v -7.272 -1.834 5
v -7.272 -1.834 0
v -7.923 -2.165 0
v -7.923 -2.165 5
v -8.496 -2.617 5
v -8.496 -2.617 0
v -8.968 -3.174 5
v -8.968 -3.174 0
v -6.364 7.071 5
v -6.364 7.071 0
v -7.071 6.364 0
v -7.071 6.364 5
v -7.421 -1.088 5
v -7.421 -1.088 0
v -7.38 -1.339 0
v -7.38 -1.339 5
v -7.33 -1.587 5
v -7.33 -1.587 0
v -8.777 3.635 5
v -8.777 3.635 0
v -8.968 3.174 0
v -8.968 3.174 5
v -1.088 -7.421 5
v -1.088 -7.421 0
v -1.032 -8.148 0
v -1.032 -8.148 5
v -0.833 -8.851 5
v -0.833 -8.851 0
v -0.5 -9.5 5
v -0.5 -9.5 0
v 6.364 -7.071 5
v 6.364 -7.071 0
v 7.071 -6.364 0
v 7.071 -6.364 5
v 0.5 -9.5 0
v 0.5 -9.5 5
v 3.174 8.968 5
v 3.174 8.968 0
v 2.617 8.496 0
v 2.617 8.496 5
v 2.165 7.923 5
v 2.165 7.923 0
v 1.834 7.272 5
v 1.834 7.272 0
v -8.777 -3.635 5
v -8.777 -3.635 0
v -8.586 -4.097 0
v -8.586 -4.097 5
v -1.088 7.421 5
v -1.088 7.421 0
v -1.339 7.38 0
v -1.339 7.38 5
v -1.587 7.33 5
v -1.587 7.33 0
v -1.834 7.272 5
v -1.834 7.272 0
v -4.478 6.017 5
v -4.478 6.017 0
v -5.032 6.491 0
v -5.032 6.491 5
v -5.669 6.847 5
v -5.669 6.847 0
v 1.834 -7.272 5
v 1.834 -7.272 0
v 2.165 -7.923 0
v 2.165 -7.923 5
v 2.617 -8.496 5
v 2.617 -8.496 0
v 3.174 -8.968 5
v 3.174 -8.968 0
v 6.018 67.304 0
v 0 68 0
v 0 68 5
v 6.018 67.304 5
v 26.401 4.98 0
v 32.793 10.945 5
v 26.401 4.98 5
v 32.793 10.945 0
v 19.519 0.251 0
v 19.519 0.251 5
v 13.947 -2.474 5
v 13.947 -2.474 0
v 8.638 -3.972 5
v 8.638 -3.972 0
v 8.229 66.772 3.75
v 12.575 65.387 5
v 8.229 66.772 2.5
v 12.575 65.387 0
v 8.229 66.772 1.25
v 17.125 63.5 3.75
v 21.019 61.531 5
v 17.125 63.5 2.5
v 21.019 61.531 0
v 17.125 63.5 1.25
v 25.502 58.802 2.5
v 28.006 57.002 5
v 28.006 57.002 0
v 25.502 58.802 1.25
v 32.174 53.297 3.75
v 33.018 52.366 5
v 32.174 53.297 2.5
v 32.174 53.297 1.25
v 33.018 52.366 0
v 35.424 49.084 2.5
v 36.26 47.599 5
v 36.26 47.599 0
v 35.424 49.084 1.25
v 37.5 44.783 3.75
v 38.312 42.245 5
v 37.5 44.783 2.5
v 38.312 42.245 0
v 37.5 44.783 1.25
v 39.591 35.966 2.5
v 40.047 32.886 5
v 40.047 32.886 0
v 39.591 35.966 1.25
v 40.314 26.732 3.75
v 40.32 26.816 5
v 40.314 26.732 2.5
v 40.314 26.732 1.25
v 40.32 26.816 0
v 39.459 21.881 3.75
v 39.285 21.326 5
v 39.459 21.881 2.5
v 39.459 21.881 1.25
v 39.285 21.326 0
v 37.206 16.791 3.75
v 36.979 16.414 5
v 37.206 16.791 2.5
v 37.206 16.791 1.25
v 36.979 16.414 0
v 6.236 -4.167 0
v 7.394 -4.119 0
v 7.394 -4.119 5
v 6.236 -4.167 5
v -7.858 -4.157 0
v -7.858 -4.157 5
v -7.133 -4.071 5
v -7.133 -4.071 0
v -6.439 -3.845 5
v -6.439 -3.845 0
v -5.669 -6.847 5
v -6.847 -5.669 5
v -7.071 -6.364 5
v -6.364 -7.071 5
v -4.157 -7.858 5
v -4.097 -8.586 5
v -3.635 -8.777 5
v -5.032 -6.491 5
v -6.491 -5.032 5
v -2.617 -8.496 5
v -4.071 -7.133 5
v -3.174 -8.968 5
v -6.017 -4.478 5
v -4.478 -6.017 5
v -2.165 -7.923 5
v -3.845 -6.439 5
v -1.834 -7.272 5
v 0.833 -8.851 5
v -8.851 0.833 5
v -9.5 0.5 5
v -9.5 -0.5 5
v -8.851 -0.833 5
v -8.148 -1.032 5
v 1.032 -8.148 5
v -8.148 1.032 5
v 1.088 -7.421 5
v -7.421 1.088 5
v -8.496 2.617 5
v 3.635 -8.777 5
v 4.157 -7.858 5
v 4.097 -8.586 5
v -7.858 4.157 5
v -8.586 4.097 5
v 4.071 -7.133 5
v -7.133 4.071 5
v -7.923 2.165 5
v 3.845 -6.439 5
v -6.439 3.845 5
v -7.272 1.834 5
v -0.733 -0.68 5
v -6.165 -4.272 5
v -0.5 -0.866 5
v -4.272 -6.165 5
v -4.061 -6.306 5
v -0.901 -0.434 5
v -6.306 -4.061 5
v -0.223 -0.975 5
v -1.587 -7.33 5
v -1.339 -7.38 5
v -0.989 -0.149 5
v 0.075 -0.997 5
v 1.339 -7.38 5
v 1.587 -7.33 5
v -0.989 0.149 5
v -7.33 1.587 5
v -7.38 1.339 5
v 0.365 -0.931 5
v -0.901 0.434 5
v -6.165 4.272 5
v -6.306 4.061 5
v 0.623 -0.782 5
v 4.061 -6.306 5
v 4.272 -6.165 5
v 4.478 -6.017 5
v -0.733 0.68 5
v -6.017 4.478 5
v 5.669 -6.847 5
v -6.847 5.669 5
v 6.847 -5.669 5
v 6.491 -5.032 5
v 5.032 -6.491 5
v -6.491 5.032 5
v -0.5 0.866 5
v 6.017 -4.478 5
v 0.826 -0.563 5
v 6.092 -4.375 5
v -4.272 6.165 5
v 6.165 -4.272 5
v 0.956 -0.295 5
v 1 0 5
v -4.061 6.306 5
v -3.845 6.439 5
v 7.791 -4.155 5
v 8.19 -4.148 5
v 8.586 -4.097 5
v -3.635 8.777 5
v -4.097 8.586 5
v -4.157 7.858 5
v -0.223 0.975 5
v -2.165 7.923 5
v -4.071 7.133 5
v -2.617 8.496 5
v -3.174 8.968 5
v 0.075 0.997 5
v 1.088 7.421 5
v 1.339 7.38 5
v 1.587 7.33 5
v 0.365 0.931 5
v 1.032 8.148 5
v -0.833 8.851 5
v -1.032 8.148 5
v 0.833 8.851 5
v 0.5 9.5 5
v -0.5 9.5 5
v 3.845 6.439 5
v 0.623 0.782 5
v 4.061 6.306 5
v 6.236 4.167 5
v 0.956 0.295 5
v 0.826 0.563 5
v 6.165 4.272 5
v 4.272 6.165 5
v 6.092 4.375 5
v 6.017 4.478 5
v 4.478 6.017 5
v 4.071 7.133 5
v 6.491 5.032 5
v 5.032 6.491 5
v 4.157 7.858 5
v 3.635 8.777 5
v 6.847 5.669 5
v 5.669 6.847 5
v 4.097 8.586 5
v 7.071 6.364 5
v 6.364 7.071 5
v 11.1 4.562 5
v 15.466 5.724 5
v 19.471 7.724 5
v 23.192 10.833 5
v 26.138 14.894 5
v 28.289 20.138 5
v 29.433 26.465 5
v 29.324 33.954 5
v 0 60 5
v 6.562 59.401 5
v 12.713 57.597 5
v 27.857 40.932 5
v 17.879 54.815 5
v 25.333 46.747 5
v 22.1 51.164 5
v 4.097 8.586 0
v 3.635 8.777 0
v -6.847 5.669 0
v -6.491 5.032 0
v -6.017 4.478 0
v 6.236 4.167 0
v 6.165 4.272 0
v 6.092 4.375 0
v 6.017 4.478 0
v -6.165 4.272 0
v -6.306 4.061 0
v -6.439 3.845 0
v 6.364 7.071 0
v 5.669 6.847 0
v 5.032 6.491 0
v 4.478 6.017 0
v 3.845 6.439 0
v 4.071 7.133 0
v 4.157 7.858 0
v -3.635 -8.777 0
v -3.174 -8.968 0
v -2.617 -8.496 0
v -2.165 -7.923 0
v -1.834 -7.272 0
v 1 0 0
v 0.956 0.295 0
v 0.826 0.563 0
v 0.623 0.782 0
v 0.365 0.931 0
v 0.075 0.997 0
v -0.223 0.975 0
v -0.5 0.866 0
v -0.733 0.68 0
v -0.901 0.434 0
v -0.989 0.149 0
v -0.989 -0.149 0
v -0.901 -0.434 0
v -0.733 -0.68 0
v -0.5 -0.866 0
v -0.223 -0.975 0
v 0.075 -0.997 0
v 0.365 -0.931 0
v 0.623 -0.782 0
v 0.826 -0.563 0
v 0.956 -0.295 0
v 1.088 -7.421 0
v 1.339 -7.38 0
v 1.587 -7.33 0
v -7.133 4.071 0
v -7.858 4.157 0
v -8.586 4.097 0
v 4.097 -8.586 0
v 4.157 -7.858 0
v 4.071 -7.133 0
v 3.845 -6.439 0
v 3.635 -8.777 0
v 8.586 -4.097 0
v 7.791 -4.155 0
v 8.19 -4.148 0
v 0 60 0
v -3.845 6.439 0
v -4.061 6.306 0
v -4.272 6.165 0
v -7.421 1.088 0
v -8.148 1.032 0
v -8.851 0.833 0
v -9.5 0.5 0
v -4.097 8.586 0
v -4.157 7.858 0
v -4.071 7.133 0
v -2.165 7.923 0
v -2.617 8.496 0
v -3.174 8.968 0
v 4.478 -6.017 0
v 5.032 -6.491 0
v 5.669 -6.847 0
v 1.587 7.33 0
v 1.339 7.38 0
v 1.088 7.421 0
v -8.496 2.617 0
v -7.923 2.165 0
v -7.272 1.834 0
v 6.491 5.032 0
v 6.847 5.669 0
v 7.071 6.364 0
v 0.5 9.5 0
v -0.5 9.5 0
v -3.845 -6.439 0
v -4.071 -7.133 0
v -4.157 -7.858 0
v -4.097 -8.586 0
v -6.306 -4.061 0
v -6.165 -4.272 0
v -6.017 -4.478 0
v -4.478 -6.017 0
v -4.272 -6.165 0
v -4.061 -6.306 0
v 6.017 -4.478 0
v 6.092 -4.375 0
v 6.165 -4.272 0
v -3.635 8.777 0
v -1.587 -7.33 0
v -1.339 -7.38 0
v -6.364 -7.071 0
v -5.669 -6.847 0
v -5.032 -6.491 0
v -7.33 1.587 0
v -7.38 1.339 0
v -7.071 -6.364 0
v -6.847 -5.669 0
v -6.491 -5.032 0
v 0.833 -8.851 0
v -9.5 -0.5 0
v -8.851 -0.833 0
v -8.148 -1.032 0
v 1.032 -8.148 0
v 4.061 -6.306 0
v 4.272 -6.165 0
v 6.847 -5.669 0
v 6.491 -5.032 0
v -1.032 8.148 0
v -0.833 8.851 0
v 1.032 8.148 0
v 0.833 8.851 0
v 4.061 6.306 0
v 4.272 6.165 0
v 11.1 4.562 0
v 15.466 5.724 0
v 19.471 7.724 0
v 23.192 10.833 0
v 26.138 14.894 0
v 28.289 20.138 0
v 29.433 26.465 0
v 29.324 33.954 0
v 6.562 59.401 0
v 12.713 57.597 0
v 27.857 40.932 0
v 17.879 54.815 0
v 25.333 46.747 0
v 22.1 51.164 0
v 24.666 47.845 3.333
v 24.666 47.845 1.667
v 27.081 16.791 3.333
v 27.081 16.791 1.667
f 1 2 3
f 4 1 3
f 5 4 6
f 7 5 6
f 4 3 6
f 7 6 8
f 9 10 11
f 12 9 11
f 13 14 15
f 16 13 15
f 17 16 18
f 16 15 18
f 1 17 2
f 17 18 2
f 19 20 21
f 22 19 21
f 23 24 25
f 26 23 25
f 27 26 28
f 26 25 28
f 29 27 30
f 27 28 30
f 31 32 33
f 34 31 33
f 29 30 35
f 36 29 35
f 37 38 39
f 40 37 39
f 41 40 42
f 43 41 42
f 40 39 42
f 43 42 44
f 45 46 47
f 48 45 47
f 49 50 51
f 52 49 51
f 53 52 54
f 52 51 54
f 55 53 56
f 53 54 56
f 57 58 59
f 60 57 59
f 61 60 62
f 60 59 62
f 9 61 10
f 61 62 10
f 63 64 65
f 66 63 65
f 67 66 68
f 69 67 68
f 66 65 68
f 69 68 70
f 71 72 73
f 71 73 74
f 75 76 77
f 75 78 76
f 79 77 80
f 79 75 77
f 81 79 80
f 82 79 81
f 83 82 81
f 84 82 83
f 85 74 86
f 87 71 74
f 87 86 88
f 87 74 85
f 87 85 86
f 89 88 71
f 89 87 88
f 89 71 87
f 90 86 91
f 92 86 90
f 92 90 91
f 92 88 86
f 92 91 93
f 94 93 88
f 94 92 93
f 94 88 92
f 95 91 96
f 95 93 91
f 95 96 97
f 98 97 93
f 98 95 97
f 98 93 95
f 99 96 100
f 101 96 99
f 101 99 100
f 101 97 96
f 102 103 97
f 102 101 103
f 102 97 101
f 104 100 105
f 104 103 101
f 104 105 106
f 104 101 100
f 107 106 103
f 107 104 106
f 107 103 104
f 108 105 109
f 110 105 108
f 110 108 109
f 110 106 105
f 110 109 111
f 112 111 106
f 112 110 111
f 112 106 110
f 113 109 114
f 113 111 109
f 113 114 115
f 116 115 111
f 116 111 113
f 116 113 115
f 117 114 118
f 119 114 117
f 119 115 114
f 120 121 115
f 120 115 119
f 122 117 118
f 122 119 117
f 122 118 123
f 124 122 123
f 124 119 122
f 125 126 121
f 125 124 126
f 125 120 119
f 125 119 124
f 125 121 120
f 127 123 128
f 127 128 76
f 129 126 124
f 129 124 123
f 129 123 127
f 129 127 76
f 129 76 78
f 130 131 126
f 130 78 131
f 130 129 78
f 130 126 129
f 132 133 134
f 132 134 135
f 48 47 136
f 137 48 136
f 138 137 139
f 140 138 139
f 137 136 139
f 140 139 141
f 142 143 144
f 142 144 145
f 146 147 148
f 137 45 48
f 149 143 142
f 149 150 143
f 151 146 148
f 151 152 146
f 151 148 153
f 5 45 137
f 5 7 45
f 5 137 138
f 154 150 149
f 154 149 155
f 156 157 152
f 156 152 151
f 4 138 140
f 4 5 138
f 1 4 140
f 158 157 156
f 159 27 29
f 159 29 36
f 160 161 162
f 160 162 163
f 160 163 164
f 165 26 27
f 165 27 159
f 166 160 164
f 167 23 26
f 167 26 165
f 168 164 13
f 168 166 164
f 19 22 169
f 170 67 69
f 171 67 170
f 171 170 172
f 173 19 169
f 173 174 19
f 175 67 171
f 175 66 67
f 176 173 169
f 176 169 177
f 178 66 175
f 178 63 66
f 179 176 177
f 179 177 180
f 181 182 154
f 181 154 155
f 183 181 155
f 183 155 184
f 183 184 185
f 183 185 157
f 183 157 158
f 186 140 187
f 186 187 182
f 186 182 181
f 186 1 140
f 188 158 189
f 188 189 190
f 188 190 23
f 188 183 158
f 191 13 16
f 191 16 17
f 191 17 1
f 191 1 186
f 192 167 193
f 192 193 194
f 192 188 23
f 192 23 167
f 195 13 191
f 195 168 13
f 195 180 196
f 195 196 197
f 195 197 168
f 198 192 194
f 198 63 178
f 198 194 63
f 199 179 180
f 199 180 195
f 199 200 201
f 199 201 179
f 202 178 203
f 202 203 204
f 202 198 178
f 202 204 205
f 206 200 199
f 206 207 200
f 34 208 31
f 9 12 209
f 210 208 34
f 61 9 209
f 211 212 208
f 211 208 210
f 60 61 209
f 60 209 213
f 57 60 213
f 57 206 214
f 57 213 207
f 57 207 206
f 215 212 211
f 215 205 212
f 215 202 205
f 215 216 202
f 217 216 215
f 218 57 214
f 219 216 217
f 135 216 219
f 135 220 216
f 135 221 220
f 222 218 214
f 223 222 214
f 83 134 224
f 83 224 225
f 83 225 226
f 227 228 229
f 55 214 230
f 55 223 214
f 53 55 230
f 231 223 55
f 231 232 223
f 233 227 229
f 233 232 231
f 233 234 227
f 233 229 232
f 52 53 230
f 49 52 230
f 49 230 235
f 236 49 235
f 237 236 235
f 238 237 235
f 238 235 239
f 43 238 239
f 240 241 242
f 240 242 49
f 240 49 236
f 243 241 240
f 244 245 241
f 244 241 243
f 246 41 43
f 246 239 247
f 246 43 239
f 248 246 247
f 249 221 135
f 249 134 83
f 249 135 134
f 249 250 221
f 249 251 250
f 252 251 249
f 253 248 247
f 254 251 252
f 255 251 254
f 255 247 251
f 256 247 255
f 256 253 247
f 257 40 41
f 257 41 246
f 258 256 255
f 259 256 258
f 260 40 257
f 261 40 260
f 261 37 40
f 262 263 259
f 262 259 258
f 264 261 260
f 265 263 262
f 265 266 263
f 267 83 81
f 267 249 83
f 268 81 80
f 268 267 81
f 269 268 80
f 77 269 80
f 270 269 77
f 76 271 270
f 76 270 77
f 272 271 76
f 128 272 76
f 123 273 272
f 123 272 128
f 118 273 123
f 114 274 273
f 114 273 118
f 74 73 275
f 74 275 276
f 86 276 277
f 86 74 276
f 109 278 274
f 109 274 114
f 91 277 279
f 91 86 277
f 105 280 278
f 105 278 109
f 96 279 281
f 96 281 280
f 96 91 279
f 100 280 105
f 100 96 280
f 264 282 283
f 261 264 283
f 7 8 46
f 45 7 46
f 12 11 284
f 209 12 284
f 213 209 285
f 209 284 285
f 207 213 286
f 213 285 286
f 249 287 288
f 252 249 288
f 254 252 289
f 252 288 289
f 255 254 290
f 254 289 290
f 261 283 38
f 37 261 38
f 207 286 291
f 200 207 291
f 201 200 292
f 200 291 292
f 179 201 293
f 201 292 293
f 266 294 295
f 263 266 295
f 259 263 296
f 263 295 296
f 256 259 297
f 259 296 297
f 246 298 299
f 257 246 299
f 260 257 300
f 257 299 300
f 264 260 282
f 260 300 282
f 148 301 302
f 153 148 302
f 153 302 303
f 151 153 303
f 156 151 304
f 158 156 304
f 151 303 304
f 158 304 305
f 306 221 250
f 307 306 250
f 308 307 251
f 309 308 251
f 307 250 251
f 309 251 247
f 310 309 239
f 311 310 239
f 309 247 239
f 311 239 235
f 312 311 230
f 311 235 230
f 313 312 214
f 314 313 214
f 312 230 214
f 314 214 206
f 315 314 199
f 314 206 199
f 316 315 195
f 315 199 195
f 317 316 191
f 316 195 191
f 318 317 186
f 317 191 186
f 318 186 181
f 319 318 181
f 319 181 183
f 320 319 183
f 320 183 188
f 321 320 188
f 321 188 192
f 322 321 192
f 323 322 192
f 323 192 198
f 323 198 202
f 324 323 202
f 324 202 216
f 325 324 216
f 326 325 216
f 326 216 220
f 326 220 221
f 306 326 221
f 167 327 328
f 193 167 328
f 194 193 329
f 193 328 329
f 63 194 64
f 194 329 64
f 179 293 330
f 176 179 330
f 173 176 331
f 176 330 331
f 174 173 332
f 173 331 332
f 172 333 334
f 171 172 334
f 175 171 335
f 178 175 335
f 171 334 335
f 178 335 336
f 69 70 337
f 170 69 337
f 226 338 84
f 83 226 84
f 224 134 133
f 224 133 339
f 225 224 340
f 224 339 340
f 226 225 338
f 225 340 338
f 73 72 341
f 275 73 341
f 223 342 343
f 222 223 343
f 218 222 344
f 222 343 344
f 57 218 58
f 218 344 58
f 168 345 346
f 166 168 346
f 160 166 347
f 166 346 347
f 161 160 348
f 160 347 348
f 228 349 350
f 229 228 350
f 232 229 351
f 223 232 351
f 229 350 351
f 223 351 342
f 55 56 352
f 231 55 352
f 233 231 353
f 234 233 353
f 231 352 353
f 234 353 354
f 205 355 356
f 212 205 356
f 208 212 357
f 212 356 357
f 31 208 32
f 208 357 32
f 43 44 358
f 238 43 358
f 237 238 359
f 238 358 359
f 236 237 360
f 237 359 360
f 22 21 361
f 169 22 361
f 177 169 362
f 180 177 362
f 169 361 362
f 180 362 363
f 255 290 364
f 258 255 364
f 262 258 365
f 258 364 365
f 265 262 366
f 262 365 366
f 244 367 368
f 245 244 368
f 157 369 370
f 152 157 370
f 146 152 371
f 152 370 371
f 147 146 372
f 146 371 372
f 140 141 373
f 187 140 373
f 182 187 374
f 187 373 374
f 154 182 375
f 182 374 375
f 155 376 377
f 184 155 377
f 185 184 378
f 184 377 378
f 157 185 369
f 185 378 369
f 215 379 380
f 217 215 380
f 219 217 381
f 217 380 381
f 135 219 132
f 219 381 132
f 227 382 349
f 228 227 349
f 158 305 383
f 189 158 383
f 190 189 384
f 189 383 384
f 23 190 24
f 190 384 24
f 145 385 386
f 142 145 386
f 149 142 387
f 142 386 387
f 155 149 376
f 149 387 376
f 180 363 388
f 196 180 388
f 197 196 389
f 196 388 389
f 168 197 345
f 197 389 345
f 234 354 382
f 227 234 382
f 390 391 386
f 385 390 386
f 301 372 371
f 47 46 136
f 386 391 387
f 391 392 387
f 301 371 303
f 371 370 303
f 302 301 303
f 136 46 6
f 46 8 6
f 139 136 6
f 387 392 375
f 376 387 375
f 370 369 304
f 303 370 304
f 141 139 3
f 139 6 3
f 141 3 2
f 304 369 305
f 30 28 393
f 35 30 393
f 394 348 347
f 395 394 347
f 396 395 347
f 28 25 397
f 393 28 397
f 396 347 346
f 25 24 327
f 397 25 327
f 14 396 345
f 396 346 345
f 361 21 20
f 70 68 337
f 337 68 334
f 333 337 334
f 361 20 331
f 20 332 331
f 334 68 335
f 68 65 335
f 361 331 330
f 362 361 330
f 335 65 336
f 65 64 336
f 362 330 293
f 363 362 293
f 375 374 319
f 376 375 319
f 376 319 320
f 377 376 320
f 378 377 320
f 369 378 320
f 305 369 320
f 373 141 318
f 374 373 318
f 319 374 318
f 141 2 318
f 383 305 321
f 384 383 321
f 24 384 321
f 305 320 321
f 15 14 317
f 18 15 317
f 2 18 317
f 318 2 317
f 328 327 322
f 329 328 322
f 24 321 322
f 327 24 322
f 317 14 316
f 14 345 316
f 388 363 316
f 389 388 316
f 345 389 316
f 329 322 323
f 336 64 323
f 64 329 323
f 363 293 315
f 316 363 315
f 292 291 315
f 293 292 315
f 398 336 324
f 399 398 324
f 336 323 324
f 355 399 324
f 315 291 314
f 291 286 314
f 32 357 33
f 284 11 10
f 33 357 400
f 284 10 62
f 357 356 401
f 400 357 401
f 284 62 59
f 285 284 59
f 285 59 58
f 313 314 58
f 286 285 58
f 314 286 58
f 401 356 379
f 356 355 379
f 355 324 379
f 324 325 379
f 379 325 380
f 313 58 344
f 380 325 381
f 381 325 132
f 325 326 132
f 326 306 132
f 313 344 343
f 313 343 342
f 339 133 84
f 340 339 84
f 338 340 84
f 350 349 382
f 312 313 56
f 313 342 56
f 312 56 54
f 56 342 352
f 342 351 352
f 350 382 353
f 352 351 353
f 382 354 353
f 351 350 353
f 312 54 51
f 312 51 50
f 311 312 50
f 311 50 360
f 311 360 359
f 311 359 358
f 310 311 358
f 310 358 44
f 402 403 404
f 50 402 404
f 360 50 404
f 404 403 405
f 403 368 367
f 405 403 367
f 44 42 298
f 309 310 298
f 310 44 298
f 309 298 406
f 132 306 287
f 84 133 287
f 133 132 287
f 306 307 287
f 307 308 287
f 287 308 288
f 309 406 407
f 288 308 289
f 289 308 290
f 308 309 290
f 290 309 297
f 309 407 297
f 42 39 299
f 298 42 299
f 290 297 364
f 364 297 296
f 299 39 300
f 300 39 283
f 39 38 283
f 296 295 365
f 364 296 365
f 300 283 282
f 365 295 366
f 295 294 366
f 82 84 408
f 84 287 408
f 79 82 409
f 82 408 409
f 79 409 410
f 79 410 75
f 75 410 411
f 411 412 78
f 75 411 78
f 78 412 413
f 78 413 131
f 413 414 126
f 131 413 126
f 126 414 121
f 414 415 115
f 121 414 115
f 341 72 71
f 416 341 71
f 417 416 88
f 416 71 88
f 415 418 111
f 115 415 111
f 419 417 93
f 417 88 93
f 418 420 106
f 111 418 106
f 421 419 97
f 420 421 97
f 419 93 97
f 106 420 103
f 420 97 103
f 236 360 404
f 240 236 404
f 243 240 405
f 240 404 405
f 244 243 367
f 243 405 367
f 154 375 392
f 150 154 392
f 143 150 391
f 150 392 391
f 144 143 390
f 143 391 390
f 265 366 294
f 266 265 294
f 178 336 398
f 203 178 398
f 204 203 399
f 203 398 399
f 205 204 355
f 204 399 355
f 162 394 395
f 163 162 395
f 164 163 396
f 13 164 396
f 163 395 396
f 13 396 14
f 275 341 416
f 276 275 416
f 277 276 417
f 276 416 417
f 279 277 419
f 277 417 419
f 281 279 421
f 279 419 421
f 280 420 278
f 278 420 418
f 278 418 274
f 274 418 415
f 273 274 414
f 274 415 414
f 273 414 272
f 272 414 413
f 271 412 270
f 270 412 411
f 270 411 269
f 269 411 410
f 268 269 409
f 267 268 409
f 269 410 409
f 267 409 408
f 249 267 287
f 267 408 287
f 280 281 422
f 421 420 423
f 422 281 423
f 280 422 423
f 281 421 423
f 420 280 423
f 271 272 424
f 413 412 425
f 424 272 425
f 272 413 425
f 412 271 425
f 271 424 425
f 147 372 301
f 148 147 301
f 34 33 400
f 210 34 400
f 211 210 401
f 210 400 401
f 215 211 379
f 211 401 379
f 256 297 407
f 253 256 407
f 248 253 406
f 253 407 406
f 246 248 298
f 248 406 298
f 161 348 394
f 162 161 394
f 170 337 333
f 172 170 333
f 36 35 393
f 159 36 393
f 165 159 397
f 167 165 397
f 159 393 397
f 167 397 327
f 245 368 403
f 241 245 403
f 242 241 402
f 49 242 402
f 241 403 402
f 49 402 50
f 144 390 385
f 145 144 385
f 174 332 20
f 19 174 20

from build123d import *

# Parameters (mm, degrees)
F1_DEPTH = 5
F2_R     = 1
F3_DEPTH = 5.001
F5_DEPTH = 5


with BuildPart() as f1:
    # F0 (on Top) → F1 (new body)
    with BuildSketch(Plane.XY):
        with BuildLine():
            ThreePointArc((7.4206173165, -1.0883191822), (7.4801280027, -0.5456052265), (7.5, 0))
            ThreePointArc((7.5, 0), (7.4801280027, 0.5456052265), (7.4206173165, 1.0883191822))
            ThreePointArc((7.4206173165, 1.0883191822), (7.355889603, 1.4631774151), (7.2722381774, 1.8342714877))
            ThreePointArc((7.2722381774, 1.8342714877), (6.9290964938, 2.8701257427), (6.4392747372, 3.8452231222))
            ThreePointArc((6.4392747372, 3.8452231222), (6.2360220923, 4.1667767476), (6.0167266989, 4.4776109513))
            ThreePointArc((6.0167266989, 4.4776109513), (5.3033008589, 5.3033008589), (4.4776109513, 6.0167266989))
            ThreePointArc((4.4776109513, 6.0167266989), (4.1667767476, 6.2360220923), (3.8452231222, 6.4392747372))
            ThreePointArc((3.8452231222, 6.4392747372), (2.8701257427, 6.9290964938), (1.8342714877, 7.2722381774))
            ThreePointArc((1.8342714877, 7.2722381774), (1.4631774151, 7.355889603), (1.0883191822, 7.4206173165))
            ThreePointArc((1.0883191822, 7.4206173165), (0.5456052265, 7.4801280027), (0, 7.5))
            ThreePointArc((0, 7.5), (-0.5456052265, 7.4801280027), (-1.0883191822, 7.4206173165))
            ThreePointArc((-1.0883191822, 7.4206173165), (-1.4631774151, 7.355889603), (-1.8342714877, 7.2722381774))
            ThreePointArc((-1.8342714877, 7.2722381774), (-2.8701257427, 6.9290964938), (-3.8452231222, 6.4392747372))
            ThreePointArc((-3.8452231222, 6.4392747372), (-4.1667767476, 6.2360220923), (-4.4776109513, 6.0167266989))
            ThreePointArc((-4.4776109513, 6.0167266989), (-5.3033008589, 5.3033008589), (-6.0167266989, 4.4776109513))
            ThreePointArc((-6.0167266989, 4.4776109513), (-6.2360220923, 4.1667767476), (-6.4392747372, 3.8452231222))
            ThreePointArc((-6.4392747372, 3.8452231222), (-6.9290964938, 2.8701257427), (-7.2722381774, 1.8342714877))
            ThreePointArc((-7.2722381774, 1.8342714877), (-7.355889603, 1.4631774151), (-7.4206173165, 1.0883191822))
            ThreePointArc((-7.4206173165, 1.0883191822), (-7.5, 0), (-7.4206173165, -1.0883191822))
            ThreePointArc((-7.4206173165, -1.0883191822), (-7.355889603, -1.4631774151), (-7.2722381774, -1.8342714877))
            ThreePointArc((-7.2722381774, -1.8342714877), (-6.9290964938, -2.8701257427), (-6.4392747372, -3.8452231222))
            ThreePointArc((-6.4392747372, -3.8452231222), (-6.2360220923, -4.1667767476), (-6.0167266989, -4.4776109513))
            ThreePointArc((-6.0167266989, -4.4776109513), (-5.3033008589, -5.3033008589), (-4.4776109513, -6.0167266989))
            ThreePointArc((-4.4776109513, -6.0167266989), (-4.1667767476, -6.2360220923), (-3.8452231222, -6.4392747372))
            ThreePointArc((-3.8452231222, -6.4392747372), (-2.8701257427, -6.9290964938), (-1.8342714877, -7.2722381774))
            ThreePointArc((-1.8342714877, -7.2722381774), (-1.4631774151, -7.355889603), (-1.0883191822, -7.4206173165))
            ThreePointArc((-1.0883191822, -7.4206173165), (0, -7.5), (1.0883191822, -7.4206173165))
            ThreePointArc((1.0883191822, -7.4206173165), (1.4631774151, -7.355889603), (1.8342714877, -7.2722381774))
            ThreePointArc((1.8342714877, -7.2722381774), (2.8701257427, -6.9290964938), (3.8452231222, -6.4392747372))
            ThreePointArc((3.8452231222, -6.4392747372), (4.1667767476, -6.2360220923), (4.4776109513, -6.0167266989))
            ThreePointArc((4.4776109513, -6.0167266989), (5.3033008589, -5.3033008589), (6.0167266989, -4.4776109513))
            ThreePointArc((6.0167266989, -4.4776109513), (6.2360220923, -4.1667767476), (6.4392747372, -3.8452231222))
            ThreePointArc((6.4392747372, -3.8452231222), (6.9290964938, -2.8701257427), (7.2722381774, -1.8342714877))
            ThreePointArc((7.2722381774, -1.8342714877), (7.355889603, -1.4631774151), (7.4206173165, -1.0883191822))
        make_face()
        with BuildLine():
            ThreePointArc((7.4206173165, 1.0883191822), (7.4801280027, 0.5456052265), (7.5, 0))
            ThreePointArc((7.5, 0), (7.4801280027, -0.5456052265), (7.4206173165, -1.0883191822))
            ThreePointArc((7.4206173165, -1.0883191822), (8.5043518229, -0.9498278009), (9.5, -0.5))
            Line((9.5, -0.5), (9.5, 0))
            Line((9.5, 0), (9.5, 0.5))
            ThreePointArc((9.5, 0.5), (8.5043518229, 0.9498278009), (7.4206173165, 1.0883191822))
        make_face()
        with BuildLine():
            ThreePointArc((6.4392747372, 3.8452231222), (6.9290964938, 2.8701257427), (7.2722381774, 1.8342714877))
            ThreePointArc((7.2722381774, 1.8342714877), (8.2204799494, 2.376948081), (8.968197275, 3.1735528412))
            Line((8.968197275, 3.1735528412), (8.7768555589, 3.6354926075))
            Line((8.7768555589, 3.6354926075), (8.5855138427, 4.0974323737))
            ThreePointArc((8.5855138427, 4.0974323737), (7.4935132234, 4.1320010103), (6.4392747372, 3.8452231222))
        make_face()
        with BuildLine():
            ThreePointArc((8.968197275, -3.1735528412), (8.2204799494, -2.376948081), (7.2722381774, -1.8342714877))
            ThreePointArc((7.2722381774, -1.8342714877), (6.9290964938, -2.8701257427), (6.4392747372, -3.8452231222))
            ThreePointArc((6.4392747372, -3.8452231222), (7.4935132234, -4.1320010103), (8.5855138427, -4.0974323737))
            Line((8.5855138427, -4.0974323737), (8.7768555589, -3.6354926075))
            Line((8.7768555589, -3.6354926075), (8.968197275, -3.1735528412))
        make_face()
        with BuildLine():
            ThreePointArc((4.4776109513, 6.0167266989), (5.3033008589, 5.3033008589), (6.0167266989, 4.4776109513))
            ThreePointArc((6.0167266989, 4.4776109513), (6.6851145225, 5.3418551646), (7.0710678119, 6.3639610307))
            Line((7.0710678119, 6.3639610307), (6.7175144213, 6.7175144213))
            Line((6.7175144213, 6.7175144213), (6.3639610307, 7.0710678119))
            ThreePointArc((6.3639610307, 7.0710678119), (5.3418551646, 6.6851145225), (4.4776109513, 6.0167266989))
        make_face()
        with BuildLine():
            ThreePointArc((7.0710678119, -6.3639610307), (6.6851145225, -5.3418551646), (6.0167266989, -4.4776109513))
            ThreePointArc((6.0167266989, -4.4776109513), (5.3033008589, -5.3033008589), (4.4776109513, -6.0167266989))
            ThreePointArc((4.4776109513, -6.0167266989), (5.3418551646, -6.6851145225), (6.3639610307, -7.0710678119))
            Line((6.3639610307, -7.0710678119), (6.7175144213, -6.7175144213))
            Line((6.7175144213, -6.7175144213), (7.0710678119, -6.3639610307))
        make_face()
        with BuildLine():
            ThreePointArc((1.8342714877, 7.2722381774), (2.8701257427, 6.9290964938), (3.8452231222, 6.4392747372))
            ThreePointArc((3.8452231222, 6.4392747372), (4.1320010103, 7.4935132234), (4.0974323737, 8.5855138427))
            Line((4.0974323737, 8.5855138427), (3.6354926075, 8.7768555589))
            Line((3.6354926075, 8.7768555589), (3.1735528412, 8.968197275))
            ThreePointArc((3.1735528412, 8.968197275), (2.376948081, 8.2204799494), (1.8342714877, 7.2722381774))
        make_face()
        with BuildLine():
            ThreePointArc((4.0974323737, -8.5855138427), (4.1320010103, -7.4935132234), (3.8452231222, -6.4392747372))
            ThreePointArc((3.8452231222, -6.4392747372), (2.8701257427, -6.9290964938), (1.8342714877, -7.2722381774))
            ThreePointArc((1.8342714877, -7.2722381774), (2.376948081, -8.2204799494), (3.1735528412, -8.968197275))
            Line((3.1735528412, -8.968197275), (3.6354926075, -8.7768555589))
            Line((3.6354926075, -8.7768555589), (4.0974323737, -8.5855138427))
        make_face()
        with BuildLine():
            ThreePointArc((0, 7.5), (0.5456052265, 7.4801280027), (1.0883191822, 7.4206173165))
            ThreePointArc((1.0883191822, 7.4206173165), (0.9498278009, 8.5043518229), (0.5, 9.5))
            Line((0.5, 9.5), (0, 9.5))
            Line((0, 9.5), (0, 7.5))
        make_face()
        with BuildLine():
            ThreePointArc((0.5, -9.5), (0.9498278009, -8.5043518229), (1.0883191822, -7.4206173165))
            ThreePointArc((1.0883191822, -7.4206173165), (0, -7.5), (-1.0883191822, -7.4206173165))
            ThreePointArc((-1.0883191822, -7.4206173165), (-0.9498278009, -8.5043518229), (-0.5, -9.5))
            Line((-0.5, -9.5), (0, -9.5))
            Line((0, -9.5), (0.5, -9.5))
        make_face()
        with BuildLine():
            ThreePointArc((-1.0883191822, 7.4206173165), (-0.5456052265, 7.4801280027), (0, 7.5))
            Line((0, 7.5), (0, 9.5))
            Line((0, 9.5), (-0.5, 9.5))
            ThreePointArc((-0.5, 9.5), (-0.9498278009, 8.5043518229), (-1.0883191822, 7.4206173165))
        make_face()
        with BuildLine():
            ThreePointArc((-3.1735528412, -8.968197275), (-2.376948081, -8.2204799494), (-1.8342714877, -7.2722381774))
            ThreePointArc((-1.8342714877, -7.2722381774), (-2.8701257427, -6.9290964938), (-3.8452231222, -6.4392747372))
            ThreePointArc((-3.8452231222, -6.4392747372), (-4.1320010103, -7.4935132234), (-4.0974323737, -8.5855138427))
            Line((-4.0974323737, -8.5855138427), (-3.6354926075, -8.7768555589))
            Line((-3.6354926075, -8.7768555589), (-3.1735528412, -8.968197275))
        make_face()
        with BuildLine():
            ThreePointArc((-3.8452231222, 6.4392747372), (-2.8701257427, 6.9290964938), (-1.8342714877, 7.2722381774))
            ThreePointArc((-1.8342714877, 7.2722381774), (-2.376948081, 8.2204799494), (-3.1735528412, 8.968197275))
            Line((-3.1735528412, 8.968197275), (-3.6354926075, 8.7768555589))
            Line((-3.6354926075, 8.7768555589), (-4.0974323737, 8.5855138427))
            ThreePointArc((-4.0974323737, 8.5855138427), (-4.1320010103, 7.4935132234), (-3.8452231222, 6.4392747372))
        make_face()
        with BuildLine():
            ThreePointArc((-6.3639610307, -7.0710678119), (-5.3418551646, -6.6851145225), (-4.4776109513, -6.0167266989))
            ThreePointArc((-4.4776109513, -6.0167266989), (-5.3033008589, -5.3033008589), (-6.0167266989, -4.4776109513))
            ThreePointArc((-6.0167266989, -4.4776109513), (-6.6851145225, -5.3418551646), (-7.0710678119, -6.3639610307))
            Line((-7.0710678119, -6.3639610307), (-6.7175144213, -6.7175144213))
            Line((-6.7175144213, -6.7175144213), (-6.3639610307, -7.0710678119))
        make_face()
        with BuildLine():
            ThreePointArc((-6.0167266989, 4.4776109513), (-5.3033008589, 5.3033008589), (-4.4776109513, 6.0167266989))
            ThreePointArc((-4.4776109513, 6.0167266989), (-5.3418551646, 6.6851145225), (-6.3639610307, 7.0710678119))
            Line((-6.3639610307, 7.0710678119), (-6.7175144213, 6.7175144213))
            Line((-6.7175144213, 6.7175144213), (-7.0710678119, 6.3639610307))
            ThreePointArc((-7.0710678119, 6.3639610307), (-6.6851145225, 5.3418551646), (-6.0167266989, 4.4776109513))
        make_face()
        with BuildLine():
            ThreePointArc((-8.5855138427, -4.0974323737), (-7.4935132234, -4.1320010103), (-6.4392747372, -3.8452231222))
            ThreePointArc((-6.4392747372, -3.8452231222), (-6.9290964938, -2.8701257427), (-7.2722381774, -1.8342714877))
            ThreePointArc((-7.2722381774, -1.8342714877), (-8.2204799494, -2.376948081), (-8.968197275, -3.1735528412))
            Line((-8.968197275, -3.1735528412), (-8.7768555589, -3.6354926075))
            Line((-8.7768555589, -3.6354926075), (-8.5855138427, -4.0974323737))
        make_face()
        with BuildLine():
            ThreePointArc((-7.2722381774, 1.8342714877), (-6.9290964938, 2.8701257427), (-6.4392747372, 3.8452231222))
            ThreePointArc((-6.4392747372, 3.8452231222), (-7.4935132234, 4.1320010103), (-8.5855138427, 4.0974323737))
            Line((-8.5855138427, 4.0974323737), (-8.7768555589, 3.6354926075))
            Line((-8.7768555589, 3.6354926075), (-8.968197275, 3.1735528412))
            ThreePointArc((-8.968197275, 3.1735528412), (-8.2204799494, 2.376948081), (-7.2722381774, 1.8342714877))
        make_face()
        with BuildLine():
            ThreePointArc((-9.5, -0.5), (-8.5043518229, -0.9498278009), (-7.4206173165, -1.0883191822))
            ThreePointArc((-7.4206173165, -1.0883191822), (-7.5, 0), (-7.4206173165, 1.0883191822))
            ThreePointArc((-7.4206173165, 1.0883191822), (-8.5043518229, 0.9498278009), (-9.5, 0.5))
            Line((-9.5, 0.5), (-9.5, 0))
            Line((-9.5, 0), (-9.5, -0.5))
        make_face()
    extrude(amount=F1_DEPTH)

    # F2 (on face) → F3 (cut, through all)
    with BuildSketch(Plane.XY.offset(5)):
        Circle(F2_R)
    extrude(amount=-F3_DEPTH, mode=Mode.SUBTRACT)

    # F4 (on Top) → F5 (join, through all)
    with BuildSketch(Plane.XY):
        with BuildLine():
            Line((0, 68), (0, 60))
            add(Edge.make_bspline(
                [(0, 60), (10, 60), (29.4589387842, 51.7186151353), (31.8140897769, 14.0256230185), (16.2360220923, 4.1667767476), (6.2360220923, 4.1667767476)],
                knots=[0, 0, 0, 0, 0.3327015989, 0.6867941822, 1, 1, 1, 1], degree=3))
            Line((6.2360220923, 4.1667767476), (6.2360220923, -4.1667767476))
            add(Edge.make_bspline(
                [(0, 68), (10, 68), (35.8485249269, 55.7196717708), (39.8112176928, 36.0292510821), (42.4043860037, 15.1807935545), (16.2360220923, -4.1667767476), (6.2360220923, -4.1667767476)],
                knots=[0, 0, 0, 0, 0.2859390076, 0.4946749487, 0.7060078455, 1, 1, 1, 1], degree=3))
        make_face()
    extrude(amount=F5_DEPTH)


solid = f1.part
